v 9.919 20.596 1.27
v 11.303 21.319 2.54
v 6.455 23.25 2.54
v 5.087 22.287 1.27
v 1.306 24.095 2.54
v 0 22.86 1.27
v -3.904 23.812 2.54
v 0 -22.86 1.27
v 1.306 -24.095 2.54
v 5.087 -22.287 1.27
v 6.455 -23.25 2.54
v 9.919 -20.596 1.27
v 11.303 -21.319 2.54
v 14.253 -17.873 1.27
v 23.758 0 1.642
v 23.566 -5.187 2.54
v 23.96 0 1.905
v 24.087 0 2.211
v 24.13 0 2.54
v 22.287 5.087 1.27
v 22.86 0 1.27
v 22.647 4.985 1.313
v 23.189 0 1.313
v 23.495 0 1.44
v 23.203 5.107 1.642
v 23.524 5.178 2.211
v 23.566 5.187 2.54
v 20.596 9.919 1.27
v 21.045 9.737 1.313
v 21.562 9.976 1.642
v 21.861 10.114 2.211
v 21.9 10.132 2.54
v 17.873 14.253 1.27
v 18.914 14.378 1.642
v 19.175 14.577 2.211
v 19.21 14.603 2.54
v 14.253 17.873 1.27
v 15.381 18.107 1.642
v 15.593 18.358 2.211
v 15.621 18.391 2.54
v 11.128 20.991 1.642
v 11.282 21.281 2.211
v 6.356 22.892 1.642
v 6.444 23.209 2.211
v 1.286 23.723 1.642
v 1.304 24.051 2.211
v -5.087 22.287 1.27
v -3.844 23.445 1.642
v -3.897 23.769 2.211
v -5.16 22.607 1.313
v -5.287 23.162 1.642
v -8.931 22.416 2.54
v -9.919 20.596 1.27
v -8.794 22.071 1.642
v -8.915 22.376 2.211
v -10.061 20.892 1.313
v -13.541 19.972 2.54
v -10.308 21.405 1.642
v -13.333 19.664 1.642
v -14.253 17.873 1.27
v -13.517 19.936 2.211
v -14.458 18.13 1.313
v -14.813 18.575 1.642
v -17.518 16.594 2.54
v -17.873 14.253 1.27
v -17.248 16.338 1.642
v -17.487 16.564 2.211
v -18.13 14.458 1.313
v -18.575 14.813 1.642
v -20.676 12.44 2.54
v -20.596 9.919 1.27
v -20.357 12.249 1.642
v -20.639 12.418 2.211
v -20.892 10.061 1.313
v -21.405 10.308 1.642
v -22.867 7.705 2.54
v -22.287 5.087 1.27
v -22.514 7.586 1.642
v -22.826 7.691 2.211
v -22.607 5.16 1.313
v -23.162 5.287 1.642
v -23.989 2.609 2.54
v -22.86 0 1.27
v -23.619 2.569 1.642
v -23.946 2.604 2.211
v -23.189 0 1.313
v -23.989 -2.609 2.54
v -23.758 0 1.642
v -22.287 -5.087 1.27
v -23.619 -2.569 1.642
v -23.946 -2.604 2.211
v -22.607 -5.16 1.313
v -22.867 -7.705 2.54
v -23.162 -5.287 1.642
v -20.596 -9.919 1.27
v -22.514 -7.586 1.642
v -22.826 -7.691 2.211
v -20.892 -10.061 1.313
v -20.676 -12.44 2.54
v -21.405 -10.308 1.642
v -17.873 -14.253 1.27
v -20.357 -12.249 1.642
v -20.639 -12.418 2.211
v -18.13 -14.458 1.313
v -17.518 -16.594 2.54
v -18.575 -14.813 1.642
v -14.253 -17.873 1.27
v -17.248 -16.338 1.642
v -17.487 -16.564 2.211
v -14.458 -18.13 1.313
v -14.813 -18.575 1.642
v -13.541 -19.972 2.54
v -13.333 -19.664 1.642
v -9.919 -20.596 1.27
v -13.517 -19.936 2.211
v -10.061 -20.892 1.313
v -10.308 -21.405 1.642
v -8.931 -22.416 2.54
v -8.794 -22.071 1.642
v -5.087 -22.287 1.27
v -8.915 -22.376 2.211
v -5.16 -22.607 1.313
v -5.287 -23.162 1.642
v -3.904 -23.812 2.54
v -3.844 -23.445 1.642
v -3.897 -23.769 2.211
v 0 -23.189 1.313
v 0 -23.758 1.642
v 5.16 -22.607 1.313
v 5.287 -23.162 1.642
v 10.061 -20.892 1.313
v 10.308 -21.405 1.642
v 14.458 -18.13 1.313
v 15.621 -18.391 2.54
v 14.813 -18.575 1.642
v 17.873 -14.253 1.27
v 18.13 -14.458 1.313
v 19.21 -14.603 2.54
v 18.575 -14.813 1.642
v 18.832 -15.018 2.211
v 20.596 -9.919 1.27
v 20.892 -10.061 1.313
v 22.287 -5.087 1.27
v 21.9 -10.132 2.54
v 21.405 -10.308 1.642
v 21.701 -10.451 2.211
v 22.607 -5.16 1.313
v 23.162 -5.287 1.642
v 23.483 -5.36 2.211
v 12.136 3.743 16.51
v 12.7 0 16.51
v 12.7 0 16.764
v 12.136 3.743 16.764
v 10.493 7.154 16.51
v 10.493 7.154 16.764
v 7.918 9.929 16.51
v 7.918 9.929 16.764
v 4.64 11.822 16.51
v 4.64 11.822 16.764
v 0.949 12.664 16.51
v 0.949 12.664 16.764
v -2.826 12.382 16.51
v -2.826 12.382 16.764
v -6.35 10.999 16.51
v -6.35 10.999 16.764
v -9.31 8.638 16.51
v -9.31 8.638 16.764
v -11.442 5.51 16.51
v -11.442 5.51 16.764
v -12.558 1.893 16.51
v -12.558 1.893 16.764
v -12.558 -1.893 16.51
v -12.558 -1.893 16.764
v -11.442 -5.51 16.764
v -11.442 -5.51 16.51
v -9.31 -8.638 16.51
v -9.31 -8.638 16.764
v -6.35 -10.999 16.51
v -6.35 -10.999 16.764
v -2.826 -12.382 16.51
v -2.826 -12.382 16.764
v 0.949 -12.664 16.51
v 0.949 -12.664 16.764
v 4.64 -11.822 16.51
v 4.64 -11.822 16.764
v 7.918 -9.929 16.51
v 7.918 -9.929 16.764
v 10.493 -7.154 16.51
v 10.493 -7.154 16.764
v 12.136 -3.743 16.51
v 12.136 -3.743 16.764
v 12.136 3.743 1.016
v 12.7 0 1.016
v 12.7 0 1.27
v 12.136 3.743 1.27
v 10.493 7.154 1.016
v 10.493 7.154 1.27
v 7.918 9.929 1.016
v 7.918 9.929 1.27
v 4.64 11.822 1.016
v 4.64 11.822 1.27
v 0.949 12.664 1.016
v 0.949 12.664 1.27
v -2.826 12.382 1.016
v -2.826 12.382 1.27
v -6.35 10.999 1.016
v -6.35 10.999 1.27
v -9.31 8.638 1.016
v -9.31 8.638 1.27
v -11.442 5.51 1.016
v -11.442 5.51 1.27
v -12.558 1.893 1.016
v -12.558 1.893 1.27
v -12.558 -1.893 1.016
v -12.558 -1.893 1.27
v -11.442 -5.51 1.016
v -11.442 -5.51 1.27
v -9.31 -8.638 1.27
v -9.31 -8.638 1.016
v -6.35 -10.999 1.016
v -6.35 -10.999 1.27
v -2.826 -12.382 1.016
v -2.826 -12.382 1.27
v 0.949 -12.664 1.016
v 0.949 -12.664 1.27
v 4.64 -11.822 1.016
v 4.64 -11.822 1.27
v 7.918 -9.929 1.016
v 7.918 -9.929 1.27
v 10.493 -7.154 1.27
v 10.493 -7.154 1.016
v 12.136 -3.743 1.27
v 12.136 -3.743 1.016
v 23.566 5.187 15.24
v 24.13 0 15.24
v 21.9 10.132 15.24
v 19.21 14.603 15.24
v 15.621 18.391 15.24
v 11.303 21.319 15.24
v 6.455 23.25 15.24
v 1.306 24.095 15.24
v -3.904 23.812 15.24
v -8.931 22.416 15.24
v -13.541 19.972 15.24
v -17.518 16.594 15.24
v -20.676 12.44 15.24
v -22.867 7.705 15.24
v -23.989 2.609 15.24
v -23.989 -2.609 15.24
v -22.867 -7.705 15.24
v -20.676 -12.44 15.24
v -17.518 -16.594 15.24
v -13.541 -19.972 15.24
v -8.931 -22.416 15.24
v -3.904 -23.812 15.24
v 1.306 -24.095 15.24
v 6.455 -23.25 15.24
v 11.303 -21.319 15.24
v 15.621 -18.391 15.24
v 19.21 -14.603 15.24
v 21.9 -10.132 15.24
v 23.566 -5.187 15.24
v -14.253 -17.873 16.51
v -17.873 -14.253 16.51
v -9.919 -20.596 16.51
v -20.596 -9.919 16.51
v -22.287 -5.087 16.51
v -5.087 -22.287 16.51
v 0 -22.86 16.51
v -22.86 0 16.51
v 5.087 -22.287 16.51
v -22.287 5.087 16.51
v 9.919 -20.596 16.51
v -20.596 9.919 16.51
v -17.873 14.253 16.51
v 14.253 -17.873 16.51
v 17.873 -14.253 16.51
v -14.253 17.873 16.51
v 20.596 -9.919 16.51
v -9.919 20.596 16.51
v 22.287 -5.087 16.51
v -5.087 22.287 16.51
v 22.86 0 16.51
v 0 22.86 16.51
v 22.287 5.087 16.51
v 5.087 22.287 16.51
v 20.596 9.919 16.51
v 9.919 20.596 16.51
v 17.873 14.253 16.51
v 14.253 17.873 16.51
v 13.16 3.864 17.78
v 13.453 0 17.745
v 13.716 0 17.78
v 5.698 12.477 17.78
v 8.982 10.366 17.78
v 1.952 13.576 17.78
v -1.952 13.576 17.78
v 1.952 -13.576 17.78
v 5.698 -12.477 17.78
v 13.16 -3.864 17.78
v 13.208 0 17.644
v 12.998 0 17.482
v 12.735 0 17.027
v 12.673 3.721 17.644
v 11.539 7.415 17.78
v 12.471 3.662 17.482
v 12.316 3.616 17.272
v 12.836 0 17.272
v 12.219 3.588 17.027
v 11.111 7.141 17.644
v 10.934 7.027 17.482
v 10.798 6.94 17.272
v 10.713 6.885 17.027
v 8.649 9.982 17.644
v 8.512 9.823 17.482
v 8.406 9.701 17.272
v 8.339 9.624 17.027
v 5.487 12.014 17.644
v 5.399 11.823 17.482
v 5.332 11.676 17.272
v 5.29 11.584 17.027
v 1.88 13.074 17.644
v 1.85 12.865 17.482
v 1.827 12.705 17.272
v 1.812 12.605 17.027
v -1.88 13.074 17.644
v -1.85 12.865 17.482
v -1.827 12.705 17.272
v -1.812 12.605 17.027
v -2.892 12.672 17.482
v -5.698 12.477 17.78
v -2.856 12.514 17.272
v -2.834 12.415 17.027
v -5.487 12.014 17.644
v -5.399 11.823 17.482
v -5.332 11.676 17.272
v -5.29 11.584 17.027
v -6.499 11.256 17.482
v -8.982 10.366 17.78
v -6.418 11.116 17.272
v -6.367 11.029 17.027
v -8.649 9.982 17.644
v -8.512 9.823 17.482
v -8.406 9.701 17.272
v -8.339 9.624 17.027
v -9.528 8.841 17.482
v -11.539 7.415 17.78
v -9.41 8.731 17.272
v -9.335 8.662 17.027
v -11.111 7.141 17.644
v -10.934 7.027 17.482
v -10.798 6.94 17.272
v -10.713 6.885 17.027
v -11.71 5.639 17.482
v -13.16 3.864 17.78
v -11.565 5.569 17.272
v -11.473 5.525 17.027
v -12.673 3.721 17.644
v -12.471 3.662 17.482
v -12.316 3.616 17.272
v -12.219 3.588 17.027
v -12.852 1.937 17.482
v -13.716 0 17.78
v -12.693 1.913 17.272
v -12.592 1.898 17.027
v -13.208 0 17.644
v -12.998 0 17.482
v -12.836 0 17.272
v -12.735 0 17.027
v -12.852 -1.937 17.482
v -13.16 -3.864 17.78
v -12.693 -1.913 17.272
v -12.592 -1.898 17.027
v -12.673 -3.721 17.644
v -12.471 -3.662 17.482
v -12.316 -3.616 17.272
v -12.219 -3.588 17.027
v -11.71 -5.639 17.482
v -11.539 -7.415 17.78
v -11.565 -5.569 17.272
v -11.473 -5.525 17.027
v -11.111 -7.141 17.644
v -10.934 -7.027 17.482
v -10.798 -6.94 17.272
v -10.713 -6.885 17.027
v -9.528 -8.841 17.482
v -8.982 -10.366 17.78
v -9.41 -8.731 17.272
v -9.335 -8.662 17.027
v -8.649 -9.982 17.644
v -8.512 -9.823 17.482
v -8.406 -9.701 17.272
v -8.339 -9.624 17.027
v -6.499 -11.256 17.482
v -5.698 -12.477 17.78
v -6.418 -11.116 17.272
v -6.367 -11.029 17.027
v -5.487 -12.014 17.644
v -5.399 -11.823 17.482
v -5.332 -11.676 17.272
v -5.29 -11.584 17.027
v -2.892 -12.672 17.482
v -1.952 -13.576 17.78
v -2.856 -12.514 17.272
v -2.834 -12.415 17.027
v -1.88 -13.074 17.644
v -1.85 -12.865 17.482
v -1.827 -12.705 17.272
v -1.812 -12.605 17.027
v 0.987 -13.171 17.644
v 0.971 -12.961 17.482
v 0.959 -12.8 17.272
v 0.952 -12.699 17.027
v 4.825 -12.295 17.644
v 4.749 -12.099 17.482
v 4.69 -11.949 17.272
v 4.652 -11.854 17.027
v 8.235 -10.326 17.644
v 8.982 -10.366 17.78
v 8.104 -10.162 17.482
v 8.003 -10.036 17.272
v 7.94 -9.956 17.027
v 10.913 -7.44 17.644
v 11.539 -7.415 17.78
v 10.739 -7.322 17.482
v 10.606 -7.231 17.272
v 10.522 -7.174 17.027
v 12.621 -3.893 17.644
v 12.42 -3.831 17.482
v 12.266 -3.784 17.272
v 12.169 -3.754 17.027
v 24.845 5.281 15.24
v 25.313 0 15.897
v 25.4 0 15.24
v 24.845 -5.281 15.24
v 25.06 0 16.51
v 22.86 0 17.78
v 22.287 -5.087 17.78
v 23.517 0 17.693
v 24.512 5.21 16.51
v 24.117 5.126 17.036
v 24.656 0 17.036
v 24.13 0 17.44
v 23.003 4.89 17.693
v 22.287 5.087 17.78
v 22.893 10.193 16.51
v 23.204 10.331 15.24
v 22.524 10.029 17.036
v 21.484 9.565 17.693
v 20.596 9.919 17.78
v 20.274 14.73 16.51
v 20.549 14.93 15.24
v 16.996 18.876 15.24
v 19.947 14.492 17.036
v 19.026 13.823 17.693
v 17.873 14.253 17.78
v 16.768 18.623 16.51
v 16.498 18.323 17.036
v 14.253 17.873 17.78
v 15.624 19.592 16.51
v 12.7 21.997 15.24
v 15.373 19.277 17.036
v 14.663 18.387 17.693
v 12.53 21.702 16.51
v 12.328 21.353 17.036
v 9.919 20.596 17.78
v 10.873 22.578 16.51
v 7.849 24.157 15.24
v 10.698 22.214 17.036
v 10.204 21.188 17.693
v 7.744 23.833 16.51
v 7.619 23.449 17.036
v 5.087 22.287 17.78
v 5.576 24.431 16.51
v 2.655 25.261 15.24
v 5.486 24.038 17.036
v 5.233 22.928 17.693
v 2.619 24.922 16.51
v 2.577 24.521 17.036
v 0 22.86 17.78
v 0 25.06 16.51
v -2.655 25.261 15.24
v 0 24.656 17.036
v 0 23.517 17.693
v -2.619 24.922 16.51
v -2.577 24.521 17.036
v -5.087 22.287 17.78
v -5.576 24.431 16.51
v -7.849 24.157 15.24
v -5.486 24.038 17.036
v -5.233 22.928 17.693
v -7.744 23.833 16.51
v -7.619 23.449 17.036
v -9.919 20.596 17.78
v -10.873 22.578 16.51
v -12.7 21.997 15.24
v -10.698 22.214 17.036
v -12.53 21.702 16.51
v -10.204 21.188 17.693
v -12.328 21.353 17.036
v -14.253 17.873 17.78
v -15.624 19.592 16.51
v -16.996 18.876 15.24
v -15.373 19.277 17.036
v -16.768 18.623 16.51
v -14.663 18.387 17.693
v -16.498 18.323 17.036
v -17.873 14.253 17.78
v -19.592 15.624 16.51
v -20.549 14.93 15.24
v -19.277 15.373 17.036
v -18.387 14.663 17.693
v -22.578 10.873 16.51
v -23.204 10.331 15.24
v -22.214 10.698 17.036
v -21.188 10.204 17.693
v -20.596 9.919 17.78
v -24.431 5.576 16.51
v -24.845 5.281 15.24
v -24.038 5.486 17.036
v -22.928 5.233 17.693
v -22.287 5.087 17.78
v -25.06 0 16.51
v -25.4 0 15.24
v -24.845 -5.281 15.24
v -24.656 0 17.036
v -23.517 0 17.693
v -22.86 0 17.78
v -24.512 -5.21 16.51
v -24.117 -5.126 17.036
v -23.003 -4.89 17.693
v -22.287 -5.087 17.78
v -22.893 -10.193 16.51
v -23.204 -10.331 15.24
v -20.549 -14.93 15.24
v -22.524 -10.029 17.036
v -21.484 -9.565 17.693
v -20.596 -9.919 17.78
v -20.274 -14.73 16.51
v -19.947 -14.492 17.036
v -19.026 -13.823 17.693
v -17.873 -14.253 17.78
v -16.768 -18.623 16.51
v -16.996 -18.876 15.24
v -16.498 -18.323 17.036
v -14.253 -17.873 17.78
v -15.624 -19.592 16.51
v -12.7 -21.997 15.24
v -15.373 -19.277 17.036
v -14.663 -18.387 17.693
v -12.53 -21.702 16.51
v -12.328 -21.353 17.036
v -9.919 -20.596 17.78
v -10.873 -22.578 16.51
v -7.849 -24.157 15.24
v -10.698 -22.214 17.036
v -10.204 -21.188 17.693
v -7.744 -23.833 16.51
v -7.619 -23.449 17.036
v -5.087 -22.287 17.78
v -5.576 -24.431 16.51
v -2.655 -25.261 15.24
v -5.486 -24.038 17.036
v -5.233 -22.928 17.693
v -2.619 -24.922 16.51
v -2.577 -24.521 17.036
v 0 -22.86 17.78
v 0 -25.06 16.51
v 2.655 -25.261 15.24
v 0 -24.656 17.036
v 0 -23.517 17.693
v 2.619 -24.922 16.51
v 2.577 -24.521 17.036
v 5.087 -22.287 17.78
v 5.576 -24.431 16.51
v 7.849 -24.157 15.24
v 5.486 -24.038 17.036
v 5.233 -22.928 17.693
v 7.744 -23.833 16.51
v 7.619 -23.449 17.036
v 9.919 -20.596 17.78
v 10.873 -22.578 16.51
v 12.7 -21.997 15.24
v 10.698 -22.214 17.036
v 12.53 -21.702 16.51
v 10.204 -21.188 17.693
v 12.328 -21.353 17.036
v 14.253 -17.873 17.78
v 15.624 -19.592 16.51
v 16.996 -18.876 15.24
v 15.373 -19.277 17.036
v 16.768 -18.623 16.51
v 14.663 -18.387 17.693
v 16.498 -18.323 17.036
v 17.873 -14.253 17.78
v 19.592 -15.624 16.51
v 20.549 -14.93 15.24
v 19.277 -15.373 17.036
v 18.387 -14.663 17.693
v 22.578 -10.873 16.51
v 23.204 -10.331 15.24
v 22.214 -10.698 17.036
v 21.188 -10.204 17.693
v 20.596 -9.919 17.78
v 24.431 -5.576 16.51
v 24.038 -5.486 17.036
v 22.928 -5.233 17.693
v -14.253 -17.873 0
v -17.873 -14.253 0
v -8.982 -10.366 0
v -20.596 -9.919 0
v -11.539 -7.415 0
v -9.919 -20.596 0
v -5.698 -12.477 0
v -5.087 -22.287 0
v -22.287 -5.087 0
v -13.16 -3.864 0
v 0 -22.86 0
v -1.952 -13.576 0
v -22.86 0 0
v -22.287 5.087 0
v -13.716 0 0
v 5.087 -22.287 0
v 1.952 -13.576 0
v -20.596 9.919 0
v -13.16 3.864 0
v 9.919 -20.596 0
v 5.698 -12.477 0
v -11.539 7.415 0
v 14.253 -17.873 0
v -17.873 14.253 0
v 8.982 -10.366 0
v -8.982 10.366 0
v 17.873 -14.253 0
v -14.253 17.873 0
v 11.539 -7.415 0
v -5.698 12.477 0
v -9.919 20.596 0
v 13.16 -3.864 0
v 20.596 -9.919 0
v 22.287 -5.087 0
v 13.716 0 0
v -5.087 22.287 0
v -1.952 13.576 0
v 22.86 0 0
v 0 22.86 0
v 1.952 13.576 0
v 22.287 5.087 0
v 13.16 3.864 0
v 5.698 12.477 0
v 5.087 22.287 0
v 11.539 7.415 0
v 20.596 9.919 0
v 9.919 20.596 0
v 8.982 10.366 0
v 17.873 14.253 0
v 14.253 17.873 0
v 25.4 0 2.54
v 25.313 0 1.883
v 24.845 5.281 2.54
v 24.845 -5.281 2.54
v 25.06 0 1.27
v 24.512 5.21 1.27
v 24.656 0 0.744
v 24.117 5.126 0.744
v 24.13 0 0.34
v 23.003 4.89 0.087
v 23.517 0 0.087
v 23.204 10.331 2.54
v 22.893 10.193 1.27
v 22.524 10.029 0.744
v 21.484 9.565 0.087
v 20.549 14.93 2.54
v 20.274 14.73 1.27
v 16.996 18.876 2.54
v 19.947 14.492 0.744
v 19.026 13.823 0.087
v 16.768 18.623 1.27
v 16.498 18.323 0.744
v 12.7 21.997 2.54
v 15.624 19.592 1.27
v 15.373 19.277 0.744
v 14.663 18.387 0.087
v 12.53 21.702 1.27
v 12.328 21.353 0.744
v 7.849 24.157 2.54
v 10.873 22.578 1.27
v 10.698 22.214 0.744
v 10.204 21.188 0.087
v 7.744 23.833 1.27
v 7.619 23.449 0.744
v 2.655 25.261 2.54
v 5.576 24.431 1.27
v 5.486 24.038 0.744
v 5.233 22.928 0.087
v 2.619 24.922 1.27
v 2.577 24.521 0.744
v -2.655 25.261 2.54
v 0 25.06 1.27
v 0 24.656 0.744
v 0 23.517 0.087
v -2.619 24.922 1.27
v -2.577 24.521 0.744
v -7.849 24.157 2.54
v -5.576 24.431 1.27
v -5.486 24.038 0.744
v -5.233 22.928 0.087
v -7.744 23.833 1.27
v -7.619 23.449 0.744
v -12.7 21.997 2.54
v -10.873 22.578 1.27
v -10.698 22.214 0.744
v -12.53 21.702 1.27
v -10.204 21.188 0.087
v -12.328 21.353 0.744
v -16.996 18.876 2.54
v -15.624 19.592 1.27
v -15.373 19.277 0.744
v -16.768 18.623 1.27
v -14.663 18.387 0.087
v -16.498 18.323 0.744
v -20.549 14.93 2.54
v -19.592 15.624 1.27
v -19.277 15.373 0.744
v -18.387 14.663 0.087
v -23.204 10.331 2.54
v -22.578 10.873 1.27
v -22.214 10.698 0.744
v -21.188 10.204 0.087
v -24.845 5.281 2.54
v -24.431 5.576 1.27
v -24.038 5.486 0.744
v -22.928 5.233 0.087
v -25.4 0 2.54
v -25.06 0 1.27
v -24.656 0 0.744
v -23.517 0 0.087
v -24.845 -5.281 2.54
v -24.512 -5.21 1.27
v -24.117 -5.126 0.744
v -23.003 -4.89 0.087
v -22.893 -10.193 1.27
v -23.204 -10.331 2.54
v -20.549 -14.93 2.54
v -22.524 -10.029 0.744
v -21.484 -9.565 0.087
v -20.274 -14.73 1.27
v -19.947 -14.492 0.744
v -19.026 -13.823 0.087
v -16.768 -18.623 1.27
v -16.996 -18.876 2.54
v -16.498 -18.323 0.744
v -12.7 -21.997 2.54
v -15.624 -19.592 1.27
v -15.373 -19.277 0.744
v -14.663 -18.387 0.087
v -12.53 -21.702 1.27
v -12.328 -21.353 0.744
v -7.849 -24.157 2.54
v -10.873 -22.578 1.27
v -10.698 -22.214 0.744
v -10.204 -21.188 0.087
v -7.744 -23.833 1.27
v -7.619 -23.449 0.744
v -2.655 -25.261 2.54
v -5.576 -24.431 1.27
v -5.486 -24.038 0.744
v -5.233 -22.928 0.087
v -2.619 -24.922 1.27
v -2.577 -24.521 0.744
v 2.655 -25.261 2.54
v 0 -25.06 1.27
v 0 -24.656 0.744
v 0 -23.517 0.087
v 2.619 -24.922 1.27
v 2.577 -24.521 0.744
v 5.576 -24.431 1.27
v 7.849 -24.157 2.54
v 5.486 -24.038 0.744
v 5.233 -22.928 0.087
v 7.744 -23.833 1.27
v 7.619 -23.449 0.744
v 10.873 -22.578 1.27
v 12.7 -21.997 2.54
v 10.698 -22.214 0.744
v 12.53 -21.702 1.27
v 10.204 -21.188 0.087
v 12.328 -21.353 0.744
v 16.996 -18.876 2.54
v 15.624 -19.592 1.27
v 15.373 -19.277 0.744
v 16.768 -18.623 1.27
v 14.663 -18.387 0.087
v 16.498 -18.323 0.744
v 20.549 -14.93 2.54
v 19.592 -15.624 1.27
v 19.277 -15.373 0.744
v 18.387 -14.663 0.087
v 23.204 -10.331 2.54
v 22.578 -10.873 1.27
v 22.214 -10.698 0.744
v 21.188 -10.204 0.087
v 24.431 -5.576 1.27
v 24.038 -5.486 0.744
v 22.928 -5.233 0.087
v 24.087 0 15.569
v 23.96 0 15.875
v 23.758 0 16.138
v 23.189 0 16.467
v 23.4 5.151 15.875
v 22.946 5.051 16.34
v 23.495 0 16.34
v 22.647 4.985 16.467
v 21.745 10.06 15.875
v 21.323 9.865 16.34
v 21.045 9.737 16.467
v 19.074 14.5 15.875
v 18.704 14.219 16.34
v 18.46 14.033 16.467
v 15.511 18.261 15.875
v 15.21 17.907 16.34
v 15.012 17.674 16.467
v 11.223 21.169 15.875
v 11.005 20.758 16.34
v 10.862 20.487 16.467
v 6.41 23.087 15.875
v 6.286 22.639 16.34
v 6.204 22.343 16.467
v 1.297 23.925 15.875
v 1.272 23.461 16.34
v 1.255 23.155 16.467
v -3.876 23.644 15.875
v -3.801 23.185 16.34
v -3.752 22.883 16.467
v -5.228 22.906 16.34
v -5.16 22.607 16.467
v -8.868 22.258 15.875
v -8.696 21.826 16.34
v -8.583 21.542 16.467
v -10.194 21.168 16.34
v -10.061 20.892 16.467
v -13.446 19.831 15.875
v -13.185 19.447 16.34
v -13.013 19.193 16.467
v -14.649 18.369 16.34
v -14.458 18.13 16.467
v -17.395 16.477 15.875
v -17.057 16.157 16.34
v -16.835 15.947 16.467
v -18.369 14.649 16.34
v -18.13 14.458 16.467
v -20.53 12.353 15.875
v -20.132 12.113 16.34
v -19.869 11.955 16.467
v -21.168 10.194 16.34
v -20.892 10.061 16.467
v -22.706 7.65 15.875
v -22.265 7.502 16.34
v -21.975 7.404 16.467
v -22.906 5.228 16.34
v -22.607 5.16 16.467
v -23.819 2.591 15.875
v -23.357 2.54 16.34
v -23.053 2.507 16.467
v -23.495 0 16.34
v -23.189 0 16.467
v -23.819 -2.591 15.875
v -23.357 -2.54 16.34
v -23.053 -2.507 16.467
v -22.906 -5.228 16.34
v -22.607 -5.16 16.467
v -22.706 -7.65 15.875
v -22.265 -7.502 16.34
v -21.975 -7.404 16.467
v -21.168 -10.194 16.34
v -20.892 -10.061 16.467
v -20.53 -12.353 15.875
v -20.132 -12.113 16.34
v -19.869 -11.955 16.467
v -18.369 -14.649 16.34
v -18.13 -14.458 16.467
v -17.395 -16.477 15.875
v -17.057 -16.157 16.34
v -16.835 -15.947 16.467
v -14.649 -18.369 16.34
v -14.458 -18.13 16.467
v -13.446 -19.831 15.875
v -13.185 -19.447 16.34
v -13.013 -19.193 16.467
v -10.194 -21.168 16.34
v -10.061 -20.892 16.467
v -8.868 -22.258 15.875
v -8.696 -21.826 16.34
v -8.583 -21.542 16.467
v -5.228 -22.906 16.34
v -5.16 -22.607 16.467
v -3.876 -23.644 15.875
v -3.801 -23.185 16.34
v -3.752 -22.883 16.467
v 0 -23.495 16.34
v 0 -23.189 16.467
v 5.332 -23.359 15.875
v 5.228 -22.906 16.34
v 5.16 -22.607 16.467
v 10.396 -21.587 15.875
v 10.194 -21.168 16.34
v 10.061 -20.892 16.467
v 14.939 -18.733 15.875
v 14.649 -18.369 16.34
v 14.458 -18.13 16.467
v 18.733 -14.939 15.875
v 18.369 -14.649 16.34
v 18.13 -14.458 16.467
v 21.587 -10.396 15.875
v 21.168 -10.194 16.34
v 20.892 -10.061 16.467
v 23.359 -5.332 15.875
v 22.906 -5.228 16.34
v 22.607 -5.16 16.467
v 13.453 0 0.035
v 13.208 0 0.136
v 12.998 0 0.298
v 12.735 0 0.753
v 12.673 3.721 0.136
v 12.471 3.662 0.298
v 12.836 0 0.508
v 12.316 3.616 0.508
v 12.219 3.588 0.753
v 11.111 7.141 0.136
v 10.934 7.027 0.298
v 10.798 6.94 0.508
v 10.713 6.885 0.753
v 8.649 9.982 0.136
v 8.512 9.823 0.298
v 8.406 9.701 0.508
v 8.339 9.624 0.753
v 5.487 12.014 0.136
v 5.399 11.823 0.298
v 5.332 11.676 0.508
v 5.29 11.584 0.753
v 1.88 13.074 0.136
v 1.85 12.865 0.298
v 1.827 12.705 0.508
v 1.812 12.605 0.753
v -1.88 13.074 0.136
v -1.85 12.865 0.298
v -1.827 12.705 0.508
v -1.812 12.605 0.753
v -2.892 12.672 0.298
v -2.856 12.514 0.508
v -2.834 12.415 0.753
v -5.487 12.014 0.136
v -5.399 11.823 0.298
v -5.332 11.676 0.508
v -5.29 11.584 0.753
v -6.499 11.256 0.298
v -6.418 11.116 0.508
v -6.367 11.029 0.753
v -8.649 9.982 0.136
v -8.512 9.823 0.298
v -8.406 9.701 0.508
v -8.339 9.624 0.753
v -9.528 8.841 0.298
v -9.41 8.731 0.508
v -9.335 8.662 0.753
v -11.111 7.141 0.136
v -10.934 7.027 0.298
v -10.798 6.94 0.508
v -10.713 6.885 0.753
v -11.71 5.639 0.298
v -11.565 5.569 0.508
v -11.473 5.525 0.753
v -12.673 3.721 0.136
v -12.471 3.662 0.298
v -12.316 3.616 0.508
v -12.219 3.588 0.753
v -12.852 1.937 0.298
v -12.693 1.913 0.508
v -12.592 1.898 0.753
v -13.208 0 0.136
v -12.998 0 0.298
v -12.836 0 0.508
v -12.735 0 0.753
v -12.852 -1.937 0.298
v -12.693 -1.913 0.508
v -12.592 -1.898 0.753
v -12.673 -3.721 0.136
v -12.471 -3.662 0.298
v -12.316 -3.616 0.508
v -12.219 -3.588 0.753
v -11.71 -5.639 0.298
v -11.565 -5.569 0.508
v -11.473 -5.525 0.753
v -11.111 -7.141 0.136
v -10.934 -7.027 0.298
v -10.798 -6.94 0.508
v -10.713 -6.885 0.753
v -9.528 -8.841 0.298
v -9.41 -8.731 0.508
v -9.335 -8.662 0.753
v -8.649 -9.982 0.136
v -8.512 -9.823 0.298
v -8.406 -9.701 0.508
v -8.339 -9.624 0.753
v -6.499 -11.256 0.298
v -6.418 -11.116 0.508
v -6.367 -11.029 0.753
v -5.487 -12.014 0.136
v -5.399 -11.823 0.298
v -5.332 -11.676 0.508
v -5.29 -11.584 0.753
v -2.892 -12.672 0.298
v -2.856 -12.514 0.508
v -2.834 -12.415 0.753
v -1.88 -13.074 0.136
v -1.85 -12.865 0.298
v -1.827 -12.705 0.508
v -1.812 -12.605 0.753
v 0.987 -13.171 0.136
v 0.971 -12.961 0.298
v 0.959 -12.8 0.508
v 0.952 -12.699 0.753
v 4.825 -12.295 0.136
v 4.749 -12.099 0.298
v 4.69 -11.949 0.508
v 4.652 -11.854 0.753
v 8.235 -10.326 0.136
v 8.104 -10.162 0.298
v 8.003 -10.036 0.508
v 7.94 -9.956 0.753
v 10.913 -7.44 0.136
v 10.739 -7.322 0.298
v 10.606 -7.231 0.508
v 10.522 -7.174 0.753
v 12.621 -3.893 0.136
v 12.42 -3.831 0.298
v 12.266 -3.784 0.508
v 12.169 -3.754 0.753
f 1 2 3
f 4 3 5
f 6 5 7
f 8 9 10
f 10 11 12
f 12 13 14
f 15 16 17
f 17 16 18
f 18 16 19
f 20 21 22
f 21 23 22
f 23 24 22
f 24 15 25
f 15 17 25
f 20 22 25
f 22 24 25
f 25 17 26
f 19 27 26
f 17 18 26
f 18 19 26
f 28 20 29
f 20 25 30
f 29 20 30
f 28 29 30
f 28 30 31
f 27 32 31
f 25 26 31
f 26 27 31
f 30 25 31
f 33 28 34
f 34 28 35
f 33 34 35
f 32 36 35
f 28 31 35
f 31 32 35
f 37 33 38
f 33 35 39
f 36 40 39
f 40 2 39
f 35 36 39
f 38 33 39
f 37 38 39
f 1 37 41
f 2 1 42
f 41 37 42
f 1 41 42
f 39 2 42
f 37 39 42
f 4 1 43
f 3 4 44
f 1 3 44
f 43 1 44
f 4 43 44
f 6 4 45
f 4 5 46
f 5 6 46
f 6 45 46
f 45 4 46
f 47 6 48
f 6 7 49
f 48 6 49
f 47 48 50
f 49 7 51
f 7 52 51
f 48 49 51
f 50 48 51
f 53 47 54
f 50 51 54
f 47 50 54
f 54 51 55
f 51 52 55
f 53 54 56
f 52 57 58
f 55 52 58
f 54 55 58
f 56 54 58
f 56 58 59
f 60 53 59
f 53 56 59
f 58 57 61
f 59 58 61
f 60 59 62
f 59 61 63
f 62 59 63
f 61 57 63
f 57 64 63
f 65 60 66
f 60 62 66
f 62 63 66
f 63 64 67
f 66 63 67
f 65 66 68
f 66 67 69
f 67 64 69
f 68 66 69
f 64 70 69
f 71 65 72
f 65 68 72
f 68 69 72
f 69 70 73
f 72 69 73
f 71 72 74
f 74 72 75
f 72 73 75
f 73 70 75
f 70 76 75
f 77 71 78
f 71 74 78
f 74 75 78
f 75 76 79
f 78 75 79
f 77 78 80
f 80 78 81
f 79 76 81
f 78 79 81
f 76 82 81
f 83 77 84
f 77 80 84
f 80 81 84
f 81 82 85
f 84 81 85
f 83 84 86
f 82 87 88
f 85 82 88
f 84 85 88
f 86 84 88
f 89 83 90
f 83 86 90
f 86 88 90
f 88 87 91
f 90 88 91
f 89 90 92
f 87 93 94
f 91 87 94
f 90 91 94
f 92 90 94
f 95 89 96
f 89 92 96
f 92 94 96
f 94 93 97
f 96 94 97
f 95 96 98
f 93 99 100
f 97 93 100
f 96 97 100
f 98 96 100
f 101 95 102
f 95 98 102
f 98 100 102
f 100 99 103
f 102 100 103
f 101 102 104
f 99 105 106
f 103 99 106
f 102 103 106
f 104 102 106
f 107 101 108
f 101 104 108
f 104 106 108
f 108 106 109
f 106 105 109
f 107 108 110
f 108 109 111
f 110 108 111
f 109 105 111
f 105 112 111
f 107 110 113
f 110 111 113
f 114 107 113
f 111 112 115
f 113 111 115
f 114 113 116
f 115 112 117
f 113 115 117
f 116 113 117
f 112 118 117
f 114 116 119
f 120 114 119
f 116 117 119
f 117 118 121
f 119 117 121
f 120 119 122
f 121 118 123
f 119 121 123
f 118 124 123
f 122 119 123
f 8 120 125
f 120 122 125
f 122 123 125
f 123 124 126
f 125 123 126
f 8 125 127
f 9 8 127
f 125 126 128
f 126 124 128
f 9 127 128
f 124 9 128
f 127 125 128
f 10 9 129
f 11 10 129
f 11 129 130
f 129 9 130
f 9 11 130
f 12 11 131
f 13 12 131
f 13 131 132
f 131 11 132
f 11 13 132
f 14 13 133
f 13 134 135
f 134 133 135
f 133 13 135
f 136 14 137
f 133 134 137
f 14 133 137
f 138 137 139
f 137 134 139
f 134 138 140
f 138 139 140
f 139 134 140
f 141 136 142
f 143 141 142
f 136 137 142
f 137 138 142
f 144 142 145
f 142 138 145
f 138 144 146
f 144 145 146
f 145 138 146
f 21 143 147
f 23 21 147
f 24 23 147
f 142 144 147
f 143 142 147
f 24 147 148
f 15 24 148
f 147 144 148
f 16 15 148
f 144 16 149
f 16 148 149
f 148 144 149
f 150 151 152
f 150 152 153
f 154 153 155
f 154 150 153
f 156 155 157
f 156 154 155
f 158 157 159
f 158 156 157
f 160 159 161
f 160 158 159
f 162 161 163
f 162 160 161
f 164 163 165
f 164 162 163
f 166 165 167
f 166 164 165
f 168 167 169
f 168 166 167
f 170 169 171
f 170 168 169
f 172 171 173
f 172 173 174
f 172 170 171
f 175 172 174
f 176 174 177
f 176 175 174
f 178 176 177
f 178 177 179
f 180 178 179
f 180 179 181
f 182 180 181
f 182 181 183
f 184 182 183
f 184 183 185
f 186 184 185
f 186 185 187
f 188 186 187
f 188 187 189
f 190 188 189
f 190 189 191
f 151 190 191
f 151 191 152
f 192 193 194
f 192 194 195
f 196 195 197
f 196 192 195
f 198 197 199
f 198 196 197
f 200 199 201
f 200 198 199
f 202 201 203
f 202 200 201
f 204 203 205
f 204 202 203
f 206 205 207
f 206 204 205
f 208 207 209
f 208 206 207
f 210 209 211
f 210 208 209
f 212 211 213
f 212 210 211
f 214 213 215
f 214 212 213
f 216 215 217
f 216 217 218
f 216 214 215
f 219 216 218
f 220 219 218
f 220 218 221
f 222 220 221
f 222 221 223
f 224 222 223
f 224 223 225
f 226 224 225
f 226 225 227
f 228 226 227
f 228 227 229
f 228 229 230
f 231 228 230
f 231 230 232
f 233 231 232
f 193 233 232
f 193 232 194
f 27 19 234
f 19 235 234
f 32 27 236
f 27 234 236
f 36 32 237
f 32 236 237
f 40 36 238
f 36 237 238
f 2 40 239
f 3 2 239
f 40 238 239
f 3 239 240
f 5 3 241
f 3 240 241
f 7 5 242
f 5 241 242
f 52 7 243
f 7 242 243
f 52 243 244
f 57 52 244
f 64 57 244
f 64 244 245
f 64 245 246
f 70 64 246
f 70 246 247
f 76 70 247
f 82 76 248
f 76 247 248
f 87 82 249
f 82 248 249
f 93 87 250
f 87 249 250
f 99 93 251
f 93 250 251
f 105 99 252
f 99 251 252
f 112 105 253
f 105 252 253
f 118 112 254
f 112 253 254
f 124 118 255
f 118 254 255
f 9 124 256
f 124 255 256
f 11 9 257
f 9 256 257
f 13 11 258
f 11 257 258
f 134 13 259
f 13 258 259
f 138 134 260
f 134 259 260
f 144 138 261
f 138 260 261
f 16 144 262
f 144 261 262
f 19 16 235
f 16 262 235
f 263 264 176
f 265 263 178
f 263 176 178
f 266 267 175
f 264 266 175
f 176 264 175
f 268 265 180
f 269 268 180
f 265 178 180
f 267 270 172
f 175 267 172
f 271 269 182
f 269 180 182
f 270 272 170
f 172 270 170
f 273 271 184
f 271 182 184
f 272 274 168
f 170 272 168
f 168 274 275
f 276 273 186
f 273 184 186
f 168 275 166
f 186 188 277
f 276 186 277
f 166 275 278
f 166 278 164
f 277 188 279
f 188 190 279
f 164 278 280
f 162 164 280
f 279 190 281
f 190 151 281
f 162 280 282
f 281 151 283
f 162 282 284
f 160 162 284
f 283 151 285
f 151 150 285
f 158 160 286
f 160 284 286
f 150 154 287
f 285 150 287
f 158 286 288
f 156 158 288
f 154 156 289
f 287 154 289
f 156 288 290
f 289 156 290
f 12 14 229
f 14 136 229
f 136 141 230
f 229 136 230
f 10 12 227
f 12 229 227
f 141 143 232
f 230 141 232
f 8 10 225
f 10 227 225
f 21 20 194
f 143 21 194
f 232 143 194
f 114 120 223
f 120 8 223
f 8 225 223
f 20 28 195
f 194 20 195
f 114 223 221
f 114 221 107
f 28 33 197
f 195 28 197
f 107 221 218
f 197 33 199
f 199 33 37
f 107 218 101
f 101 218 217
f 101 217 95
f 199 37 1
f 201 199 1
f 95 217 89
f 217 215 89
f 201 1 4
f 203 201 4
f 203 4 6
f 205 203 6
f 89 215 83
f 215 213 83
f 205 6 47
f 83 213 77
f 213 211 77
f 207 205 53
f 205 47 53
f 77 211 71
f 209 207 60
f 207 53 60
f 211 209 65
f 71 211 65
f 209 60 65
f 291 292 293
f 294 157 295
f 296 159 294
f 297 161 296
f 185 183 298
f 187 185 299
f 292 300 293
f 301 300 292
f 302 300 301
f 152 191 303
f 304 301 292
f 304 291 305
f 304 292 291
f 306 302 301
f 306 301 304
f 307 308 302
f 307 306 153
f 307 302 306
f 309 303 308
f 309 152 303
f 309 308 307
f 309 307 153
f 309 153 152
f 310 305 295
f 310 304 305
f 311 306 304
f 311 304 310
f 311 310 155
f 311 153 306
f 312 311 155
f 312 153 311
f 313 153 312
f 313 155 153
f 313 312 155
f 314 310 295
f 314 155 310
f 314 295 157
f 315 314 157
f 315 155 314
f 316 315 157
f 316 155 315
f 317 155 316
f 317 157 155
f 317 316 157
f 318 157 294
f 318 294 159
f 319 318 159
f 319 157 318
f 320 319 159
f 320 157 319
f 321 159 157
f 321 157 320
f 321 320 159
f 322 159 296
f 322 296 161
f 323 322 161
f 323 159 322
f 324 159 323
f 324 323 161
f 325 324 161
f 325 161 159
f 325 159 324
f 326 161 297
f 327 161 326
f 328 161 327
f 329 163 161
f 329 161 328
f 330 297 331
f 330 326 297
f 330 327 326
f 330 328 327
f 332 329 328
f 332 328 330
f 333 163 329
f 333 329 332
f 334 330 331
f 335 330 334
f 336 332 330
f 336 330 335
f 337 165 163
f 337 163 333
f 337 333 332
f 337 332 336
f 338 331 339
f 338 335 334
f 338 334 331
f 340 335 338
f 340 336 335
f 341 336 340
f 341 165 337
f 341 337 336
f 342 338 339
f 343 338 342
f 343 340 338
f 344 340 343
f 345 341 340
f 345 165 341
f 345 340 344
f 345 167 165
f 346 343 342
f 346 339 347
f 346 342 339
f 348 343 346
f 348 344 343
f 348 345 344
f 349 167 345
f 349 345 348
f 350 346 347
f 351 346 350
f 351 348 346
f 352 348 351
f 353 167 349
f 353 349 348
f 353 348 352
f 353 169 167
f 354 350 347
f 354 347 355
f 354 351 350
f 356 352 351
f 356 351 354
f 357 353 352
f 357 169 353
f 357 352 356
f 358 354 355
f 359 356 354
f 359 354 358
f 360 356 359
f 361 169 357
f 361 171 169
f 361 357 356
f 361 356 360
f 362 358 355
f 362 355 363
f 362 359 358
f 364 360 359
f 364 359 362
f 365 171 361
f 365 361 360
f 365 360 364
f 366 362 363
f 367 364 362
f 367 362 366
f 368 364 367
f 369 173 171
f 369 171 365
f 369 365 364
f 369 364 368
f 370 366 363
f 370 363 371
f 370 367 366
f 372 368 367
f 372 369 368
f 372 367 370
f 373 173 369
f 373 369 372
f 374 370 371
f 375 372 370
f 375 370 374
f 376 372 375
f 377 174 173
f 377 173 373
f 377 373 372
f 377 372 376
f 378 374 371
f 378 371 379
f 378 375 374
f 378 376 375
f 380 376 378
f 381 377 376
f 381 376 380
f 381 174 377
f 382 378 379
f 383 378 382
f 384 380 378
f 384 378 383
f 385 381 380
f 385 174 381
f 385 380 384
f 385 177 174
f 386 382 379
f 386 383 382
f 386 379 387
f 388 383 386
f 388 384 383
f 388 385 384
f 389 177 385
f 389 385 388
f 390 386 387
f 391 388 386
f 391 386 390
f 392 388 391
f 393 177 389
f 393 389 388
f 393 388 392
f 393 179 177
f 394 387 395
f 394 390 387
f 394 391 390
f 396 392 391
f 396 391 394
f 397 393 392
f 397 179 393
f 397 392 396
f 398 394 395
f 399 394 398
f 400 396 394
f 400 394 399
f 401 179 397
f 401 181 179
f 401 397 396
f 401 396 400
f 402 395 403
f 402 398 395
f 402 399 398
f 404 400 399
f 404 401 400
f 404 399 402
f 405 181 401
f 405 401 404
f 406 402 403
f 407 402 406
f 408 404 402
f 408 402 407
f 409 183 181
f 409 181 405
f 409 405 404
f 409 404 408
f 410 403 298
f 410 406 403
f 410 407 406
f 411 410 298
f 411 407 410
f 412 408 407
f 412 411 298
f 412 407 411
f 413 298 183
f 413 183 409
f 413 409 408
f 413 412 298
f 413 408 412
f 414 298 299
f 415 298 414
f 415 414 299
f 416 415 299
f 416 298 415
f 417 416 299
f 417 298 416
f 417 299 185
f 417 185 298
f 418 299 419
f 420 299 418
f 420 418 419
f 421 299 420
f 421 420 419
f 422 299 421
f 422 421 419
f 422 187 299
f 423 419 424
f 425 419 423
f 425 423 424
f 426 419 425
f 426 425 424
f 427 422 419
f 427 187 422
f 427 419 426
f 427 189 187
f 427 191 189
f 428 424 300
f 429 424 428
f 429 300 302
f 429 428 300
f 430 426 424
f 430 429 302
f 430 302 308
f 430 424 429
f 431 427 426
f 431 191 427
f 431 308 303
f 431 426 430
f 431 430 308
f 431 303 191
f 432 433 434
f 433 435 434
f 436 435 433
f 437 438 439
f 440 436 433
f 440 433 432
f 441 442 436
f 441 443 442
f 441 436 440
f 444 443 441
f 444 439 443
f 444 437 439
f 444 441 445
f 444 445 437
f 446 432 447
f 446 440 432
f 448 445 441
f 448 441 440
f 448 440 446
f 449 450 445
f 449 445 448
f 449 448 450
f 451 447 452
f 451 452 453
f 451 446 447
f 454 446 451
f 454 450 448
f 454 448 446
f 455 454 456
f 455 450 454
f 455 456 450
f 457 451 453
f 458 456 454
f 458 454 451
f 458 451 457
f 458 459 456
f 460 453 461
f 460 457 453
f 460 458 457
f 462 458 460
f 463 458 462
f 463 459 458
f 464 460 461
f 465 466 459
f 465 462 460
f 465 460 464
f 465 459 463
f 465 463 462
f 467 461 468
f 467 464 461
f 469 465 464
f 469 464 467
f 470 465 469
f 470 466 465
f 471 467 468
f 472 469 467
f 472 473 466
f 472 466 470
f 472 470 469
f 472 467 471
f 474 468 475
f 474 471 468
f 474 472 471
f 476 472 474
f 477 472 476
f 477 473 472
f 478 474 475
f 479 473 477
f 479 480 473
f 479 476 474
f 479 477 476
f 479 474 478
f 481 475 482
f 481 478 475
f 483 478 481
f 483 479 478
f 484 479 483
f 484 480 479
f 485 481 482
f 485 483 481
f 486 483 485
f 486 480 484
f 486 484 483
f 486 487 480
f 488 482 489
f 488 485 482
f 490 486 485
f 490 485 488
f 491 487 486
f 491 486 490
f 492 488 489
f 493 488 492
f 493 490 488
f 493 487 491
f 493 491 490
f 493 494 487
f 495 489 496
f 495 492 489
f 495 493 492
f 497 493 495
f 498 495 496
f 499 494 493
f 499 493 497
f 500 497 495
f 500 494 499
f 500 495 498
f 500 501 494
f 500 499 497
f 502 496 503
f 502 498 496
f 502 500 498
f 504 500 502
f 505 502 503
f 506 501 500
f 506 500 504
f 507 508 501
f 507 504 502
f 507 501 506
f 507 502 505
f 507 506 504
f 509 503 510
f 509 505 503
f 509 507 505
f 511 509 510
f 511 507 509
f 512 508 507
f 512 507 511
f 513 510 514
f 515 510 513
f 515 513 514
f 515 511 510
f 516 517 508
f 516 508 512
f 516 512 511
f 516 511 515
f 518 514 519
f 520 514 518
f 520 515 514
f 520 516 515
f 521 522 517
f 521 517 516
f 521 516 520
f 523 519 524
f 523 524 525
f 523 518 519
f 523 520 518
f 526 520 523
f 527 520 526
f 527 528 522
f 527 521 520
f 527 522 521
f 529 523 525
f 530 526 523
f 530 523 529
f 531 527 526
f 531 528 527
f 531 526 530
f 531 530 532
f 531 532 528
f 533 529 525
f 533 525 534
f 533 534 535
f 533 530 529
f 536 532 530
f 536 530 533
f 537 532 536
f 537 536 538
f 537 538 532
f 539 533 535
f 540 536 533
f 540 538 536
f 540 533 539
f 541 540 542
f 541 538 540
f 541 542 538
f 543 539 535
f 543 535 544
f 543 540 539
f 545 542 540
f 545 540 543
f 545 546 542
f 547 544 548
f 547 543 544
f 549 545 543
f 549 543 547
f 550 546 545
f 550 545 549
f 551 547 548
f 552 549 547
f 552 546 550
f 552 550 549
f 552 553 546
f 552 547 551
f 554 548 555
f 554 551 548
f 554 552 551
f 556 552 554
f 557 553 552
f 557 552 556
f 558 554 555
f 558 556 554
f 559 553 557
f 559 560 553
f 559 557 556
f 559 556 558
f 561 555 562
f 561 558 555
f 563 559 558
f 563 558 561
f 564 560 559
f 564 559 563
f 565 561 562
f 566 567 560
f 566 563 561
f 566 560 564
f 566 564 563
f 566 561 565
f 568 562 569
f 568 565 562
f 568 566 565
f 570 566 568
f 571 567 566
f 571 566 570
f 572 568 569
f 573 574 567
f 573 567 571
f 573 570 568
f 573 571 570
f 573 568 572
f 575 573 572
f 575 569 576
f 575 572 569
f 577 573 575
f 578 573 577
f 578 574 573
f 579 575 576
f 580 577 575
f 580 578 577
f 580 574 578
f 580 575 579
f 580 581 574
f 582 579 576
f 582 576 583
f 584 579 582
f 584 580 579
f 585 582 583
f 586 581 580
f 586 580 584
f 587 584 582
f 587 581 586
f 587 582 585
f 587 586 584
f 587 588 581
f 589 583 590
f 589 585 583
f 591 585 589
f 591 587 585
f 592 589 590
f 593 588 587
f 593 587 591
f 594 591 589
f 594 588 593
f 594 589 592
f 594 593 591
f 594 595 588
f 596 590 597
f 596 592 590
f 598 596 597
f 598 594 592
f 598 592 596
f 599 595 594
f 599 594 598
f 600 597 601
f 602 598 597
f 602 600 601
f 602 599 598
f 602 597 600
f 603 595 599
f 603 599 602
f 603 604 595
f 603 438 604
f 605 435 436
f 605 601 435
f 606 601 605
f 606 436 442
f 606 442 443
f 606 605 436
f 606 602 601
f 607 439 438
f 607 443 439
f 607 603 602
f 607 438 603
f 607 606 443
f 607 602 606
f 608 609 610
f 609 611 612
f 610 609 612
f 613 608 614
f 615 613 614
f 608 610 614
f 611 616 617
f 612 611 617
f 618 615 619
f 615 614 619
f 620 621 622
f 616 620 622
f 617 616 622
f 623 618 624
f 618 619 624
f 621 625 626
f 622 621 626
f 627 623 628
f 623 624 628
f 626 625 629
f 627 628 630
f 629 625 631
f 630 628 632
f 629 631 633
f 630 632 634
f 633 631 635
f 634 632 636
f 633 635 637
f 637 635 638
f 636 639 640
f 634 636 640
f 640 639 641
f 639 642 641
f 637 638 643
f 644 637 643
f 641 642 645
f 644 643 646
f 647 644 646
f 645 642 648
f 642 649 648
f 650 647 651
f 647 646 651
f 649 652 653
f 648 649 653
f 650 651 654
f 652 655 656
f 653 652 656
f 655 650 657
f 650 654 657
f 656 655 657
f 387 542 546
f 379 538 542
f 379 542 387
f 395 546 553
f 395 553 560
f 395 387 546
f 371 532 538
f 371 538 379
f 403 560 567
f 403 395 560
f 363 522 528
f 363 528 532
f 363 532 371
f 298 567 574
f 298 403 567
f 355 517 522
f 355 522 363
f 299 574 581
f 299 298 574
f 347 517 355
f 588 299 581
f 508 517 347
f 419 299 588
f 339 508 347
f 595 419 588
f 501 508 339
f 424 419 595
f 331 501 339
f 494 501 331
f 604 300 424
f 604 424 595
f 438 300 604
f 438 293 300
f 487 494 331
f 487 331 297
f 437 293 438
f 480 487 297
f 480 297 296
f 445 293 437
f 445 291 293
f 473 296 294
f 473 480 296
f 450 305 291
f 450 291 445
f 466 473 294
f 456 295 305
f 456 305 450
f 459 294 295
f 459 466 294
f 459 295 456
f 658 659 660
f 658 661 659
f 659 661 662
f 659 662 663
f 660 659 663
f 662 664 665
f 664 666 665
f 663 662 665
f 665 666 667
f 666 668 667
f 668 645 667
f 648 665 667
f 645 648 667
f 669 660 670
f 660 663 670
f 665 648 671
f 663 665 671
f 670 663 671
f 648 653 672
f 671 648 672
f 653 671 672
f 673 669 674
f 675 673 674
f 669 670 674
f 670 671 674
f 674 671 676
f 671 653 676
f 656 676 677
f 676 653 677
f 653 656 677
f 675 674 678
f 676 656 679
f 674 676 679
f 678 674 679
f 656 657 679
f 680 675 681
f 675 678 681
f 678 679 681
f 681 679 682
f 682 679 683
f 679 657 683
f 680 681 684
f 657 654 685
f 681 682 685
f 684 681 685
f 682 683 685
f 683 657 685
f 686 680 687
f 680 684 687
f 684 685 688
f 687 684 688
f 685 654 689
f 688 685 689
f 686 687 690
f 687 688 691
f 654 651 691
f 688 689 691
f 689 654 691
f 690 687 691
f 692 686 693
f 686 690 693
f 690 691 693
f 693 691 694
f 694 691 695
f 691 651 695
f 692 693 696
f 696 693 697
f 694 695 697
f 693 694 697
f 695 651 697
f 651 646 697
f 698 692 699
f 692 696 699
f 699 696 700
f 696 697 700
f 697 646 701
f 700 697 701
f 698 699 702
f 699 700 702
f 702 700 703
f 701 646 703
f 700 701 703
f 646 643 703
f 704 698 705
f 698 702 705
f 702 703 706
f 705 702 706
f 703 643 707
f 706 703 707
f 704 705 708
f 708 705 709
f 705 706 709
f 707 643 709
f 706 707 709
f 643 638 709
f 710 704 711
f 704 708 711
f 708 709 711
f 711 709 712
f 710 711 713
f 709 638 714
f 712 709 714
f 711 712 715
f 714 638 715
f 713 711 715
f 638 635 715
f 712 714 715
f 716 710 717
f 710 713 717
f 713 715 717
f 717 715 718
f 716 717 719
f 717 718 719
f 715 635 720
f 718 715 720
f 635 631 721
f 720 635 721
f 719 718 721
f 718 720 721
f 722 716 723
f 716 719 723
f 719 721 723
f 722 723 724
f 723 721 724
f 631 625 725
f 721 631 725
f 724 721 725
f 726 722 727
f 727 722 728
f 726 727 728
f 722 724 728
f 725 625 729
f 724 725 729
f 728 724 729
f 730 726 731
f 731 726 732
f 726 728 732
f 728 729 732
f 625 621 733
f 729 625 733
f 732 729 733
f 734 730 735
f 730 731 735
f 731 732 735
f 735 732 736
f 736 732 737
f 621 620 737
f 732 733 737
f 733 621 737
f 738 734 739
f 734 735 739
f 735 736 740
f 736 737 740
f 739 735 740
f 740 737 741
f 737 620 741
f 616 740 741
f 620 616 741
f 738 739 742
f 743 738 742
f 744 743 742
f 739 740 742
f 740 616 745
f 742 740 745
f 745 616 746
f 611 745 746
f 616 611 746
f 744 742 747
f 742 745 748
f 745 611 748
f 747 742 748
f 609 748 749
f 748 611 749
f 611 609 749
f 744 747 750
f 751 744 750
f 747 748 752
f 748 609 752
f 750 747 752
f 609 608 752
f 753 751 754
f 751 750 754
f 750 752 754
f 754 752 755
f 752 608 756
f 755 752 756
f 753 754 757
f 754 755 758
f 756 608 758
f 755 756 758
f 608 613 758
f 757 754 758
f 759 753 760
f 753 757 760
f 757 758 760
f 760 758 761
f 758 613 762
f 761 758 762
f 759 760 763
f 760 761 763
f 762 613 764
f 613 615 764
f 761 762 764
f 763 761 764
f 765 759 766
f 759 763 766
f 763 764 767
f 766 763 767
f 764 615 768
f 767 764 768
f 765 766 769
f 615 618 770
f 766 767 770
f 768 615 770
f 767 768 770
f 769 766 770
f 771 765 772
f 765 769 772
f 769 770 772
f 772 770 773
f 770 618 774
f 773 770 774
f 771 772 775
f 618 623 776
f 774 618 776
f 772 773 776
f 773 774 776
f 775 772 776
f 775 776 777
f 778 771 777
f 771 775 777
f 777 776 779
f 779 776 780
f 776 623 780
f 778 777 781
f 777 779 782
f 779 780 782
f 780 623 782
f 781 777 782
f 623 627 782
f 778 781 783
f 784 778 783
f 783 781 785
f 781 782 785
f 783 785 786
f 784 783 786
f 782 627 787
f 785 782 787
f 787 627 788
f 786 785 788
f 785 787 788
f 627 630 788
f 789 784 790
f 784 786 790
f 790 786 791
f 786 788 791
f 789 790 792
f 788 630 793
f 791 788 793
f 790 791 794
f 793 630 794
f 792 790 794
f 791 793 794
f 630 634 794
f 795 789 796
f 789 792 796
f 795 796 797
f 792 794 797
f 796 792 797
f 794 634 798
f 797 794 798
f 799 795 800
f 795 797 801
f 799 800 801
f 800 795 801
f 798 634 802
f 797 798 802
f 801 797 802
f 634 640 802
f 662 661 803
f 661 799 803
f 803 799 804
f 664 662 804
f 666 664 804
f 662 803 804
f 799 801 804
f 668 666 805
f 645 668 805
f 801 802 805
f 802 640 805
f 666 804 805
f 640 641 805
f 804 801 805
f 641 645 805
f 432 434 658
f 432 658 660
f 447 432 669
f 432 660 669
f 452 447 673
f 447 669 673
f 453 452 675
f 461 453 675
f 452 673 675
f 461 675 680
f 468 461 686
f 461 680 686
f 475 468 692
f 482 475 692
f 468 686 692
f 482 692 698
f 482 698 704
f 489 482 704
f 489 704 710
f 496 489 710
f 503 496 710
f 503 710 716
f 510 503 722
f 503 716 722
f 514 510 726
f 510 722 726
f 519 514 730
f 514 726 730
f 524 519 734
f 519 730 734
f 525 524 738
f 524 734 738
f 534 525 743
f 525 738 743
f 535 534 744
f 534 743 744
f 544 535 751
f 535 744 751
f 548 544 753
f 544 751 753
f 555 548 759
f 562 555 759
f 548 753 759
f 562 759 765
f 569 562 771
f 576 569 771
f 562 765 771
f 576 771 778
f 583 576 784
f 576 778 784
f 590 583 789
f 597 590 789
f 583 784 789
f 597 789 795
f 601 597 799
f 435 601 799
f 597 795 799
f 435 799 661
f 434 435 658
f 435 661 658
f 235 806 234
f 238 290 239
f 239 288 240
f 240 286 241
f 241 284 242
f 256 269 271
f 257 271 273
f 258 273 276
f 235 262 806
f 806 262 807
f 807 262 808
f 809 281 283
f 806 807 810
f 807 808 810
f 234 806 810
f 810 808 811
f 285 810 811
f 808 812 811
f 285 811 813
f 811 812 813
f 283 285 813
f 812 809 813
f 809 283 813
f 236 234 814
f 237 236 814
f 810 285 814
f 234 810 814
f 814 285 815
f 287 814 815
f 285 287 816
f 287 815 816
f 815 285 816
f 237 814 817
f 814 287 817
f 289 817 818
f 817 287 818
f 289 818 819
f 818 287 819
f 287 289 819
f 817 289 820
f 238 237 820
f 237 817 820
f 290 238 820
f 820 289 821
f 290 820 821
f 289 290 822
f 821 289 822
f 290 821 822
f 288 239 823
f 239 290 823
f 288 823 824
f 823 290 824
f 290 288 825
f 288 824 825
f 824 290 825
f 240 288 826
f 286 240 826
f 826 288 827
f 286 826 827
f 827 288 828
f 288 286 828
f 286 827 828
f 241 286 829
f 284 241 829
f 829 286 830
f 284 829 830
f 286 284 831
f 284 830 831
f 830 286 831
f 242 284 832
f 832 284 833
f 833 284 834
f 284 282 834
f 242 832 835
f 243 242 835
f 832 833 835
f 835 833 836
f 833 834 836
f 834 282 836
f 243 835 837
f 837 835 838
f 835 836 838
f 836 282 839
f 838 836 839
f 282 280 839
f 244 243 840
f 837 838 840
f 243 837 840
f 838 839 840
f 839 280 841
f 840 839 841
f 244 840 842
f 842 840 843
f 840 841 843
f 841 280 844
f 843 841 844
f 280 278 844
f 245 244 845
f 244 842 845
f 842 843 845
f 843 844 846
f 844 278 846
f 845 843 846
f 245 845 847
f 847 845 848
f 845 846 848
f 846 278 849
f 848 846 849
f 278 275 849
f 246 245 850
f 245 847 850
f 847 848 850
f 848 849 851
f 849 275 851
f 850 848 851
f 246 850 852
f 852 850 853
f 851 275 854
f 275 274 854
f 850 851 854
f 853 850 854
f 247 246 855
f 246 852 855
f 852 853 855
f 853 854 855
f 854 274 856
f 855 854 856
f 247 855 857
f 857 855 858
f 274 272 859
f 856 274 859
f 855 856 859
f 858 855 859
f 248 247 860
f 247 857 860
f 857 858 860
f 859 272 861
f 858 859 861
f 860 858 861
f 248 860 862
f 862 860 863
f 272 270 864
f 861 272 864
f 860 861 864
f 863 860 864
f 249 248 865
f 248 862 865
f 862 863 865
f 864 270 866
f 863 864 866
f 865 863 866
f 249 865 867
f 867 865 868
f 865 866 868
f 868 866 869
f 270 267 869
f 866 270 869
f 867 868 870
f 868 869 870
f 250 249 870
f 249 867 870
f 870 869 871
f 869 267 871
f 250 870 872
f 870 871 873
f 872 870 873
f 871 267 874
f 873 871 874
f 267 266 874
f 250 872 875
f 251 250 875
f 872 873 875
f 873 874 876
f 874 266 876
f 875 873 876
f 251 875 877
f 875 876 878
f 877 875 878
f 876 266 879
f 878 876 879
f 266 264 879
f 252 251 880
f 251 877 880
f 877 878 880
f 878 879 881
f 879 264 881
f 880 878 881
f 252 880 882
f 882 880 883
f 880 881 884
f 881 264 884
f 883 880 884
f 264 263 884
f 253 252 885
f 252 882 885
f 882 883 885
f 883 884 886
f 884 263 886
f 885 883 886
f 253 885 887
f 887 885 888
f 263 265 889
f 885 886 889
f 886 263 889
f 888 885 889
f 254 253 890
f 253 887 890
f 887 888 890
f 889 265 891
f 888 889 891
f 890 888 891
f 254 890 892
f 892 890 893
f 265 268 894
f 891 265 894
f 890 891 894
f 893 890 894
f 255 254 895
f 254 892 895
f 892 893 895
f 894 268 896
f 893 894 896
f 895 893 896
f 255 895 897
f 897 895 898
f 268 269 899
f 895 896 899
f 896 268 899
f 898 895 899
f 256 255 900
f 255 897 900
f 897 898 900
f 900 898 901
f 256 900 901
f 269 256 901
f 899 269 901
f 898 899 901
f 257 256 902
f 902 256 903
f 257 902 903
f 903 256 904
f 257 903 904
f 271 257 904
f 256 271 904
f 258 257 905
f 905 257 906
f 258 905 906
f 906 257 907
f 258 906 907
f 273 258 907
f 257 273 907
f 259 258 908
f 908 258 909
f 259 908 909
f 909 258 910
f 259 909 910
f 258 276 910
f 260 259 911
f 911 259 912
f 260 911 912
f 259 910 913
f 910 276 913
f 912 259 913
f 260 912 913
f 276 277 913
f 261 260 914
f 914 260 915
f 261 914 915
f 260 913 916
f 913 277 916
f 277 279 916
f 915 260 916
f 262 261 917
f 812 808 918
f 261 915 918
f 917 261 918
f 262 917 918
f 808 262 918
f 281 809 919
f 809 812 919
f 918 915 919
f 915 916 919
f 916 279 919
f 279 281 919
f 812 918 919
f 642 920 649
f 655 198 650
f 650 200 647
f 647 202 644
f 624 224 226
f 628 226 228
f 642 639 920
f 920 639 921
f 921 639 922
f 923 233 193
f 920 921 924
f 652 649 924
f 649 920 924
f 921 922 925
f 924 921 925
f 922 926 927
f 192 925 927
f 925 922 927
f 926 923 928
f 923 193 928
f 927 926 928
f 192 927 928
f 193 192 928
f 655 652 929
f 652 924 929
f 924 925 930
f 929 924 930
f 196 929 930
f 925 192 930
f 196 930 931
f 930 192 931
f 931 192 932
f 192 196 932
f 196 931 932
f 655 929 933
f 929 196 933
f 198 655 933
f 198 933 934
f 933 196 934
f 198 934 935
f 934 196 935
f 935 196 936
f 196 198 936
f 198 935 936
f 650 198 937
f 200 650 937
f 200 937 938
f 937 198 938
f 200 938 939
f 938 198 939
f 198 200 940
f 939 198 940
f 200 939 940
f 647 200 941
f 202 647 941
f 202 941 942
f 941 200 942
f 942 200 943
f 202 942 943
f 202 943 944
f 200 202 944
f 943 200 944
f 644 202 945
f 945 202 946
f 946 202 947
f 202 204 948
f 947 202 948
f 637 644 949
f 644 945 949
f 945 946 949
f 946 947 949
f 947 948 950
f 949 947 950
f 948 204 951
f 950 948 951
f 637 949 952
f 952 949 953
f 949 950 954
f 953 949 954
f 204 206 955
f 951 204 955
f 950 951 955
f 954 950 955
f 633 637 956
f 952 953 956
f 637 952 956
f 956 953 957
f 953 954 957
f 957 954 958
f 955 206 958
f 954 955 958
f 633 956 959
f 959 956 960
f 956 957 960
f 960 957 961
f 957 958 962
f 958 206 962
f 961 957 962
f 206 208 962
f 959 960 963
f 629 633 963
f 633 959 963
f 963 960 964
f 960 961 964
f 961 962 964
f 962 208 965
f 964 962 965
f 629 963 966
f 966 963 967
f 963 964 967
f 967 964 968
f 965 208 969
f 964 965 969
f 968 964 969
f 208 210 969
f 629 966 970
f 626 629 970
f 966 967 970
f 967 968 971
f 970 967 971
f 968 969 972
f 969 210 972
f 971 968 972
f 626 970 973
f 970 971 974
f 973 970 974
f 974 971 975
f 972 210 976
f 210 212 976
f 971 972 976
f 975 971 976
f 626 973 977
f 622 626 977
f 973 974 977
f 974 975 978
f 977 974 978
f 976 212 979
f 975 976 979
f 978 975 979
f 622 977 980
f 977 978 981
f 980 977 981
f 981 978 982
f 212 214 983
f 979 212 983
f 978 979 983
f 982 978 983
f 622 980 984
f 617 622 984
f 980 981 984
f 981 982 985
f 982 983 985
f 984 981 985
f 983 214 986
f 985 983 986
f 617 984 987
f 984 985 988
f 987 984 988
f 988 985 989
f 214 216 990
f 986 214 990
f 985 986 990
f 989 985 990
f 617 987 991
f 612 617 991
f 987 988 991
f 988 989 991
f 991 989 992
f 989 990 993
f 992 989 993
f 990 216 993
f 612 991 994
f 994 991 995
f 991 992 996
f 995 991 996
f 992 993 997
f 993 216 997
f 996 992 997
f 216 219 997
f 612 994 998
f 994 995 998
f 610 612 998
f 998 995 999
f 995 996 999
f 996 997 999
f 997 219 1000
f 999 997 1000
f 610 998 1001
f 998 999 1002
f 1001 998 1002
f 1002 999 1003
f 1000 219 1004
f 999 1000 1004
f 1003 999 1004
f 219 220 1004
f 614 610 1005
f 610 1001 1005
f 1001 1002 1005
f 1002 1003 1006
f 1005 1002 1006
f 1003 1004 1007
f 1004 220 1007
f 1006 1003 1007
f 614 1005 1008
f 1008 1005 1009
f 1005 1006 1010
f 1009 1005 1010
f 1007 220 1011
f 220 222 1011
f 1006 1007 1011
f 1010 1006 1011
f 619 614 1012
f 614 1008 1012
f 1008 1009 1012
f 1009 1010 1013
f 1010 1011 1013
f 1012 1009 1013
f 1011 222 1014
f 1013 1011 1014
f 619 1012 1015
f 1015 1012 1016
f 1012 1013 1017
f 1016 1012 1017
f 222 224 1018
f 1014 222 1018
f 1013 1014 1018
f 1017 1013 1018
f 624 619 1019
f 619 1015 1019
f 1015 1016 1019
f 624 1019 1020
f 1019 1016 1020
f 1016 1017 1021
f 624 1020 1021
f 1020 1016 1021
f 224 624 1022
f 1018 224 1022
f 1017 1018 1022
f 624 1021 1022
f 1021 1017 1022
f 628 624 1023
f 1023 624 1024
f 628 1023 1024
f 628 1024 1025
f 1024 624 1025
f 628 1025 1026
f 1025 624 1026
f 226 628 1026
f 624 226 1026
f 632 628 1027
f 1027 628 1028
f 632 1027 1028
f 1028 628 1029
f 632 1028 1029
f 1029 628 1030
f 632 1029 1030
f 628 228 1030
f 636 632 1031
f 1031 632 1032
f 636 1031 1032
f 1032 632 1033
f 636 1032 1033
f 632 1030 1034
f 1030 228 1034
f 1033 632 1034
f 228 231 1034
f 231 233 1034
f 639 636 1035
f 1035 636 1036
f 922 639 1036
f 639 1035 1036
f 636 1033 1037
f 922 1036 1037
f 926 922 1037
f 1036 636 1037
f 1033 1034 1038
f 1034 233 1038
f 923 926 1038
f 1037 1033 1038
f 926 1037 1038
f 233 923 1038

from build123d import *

# Parameters (mm, degrees)
SKETCH3_R           = 25.4
SKETCH3_R_2         = 12.7
EXTRUDE_THIN1_DEPTH = 17.78
FILLET1_R           = 2.54
FILLET2_R           = 1.016


# Read off the part's stored shape, not the designer's step: Shell1
with BuildPart() as part:
    # Sketch3 → Extrude-Thin1 (new body)
    with BuildSketch(Plane.XY):
        Circle(SKETCH3_R)
        Circle(SKETCH3_R_2, mode=Mode.SUBTRACT)
    extrude(amount=EXTRUDE_THIN1_DEPTH)

    # Fillet1
    fillet1_edges = [part.edges().sort_by_distance(p)[0] for p in [
        (-25.4, 0, 0),
        (-25.4, 0, 17.78),
    ]]
    fillet(fillet1_edges, radius=FILLET1_R)

    # Fillet2
    fillet2_edges = [part.edges().sort_by_distance(p)[0] for p in [
        (-12.7, 0, 0),
        (-12.7, 0, 17.78),
    ]]
    fillet(fillet2_edges, radius=FILLET2_R)

    # Shell1 outline → Shell1 (revolve, cut)
    with BuildSketch(Plane.XZ):
        with BuildLine():
            Line((22.86, 16.51), (12.7, 16.51))
            Line((12.7, 16.51), (12.7, 1.27))
            Line((12.7, 1.27), (22.86, 1.27))
            ThreePointArc((22.86, 1.27), (23.758025612, 1.641974388), (24.13, 2.54))
            Line((24.13, 2.54), (24.13, 15.24))
            ThreePointArc((24.13, 15.24), (23.758025612, 16.138025612), (22.86, 16.51))
        make_face()
    revolve(axis=Axis((0, 0, 0), (0, 0, 1)), mode=Mode.SUBTRACT)


solid = part.part
